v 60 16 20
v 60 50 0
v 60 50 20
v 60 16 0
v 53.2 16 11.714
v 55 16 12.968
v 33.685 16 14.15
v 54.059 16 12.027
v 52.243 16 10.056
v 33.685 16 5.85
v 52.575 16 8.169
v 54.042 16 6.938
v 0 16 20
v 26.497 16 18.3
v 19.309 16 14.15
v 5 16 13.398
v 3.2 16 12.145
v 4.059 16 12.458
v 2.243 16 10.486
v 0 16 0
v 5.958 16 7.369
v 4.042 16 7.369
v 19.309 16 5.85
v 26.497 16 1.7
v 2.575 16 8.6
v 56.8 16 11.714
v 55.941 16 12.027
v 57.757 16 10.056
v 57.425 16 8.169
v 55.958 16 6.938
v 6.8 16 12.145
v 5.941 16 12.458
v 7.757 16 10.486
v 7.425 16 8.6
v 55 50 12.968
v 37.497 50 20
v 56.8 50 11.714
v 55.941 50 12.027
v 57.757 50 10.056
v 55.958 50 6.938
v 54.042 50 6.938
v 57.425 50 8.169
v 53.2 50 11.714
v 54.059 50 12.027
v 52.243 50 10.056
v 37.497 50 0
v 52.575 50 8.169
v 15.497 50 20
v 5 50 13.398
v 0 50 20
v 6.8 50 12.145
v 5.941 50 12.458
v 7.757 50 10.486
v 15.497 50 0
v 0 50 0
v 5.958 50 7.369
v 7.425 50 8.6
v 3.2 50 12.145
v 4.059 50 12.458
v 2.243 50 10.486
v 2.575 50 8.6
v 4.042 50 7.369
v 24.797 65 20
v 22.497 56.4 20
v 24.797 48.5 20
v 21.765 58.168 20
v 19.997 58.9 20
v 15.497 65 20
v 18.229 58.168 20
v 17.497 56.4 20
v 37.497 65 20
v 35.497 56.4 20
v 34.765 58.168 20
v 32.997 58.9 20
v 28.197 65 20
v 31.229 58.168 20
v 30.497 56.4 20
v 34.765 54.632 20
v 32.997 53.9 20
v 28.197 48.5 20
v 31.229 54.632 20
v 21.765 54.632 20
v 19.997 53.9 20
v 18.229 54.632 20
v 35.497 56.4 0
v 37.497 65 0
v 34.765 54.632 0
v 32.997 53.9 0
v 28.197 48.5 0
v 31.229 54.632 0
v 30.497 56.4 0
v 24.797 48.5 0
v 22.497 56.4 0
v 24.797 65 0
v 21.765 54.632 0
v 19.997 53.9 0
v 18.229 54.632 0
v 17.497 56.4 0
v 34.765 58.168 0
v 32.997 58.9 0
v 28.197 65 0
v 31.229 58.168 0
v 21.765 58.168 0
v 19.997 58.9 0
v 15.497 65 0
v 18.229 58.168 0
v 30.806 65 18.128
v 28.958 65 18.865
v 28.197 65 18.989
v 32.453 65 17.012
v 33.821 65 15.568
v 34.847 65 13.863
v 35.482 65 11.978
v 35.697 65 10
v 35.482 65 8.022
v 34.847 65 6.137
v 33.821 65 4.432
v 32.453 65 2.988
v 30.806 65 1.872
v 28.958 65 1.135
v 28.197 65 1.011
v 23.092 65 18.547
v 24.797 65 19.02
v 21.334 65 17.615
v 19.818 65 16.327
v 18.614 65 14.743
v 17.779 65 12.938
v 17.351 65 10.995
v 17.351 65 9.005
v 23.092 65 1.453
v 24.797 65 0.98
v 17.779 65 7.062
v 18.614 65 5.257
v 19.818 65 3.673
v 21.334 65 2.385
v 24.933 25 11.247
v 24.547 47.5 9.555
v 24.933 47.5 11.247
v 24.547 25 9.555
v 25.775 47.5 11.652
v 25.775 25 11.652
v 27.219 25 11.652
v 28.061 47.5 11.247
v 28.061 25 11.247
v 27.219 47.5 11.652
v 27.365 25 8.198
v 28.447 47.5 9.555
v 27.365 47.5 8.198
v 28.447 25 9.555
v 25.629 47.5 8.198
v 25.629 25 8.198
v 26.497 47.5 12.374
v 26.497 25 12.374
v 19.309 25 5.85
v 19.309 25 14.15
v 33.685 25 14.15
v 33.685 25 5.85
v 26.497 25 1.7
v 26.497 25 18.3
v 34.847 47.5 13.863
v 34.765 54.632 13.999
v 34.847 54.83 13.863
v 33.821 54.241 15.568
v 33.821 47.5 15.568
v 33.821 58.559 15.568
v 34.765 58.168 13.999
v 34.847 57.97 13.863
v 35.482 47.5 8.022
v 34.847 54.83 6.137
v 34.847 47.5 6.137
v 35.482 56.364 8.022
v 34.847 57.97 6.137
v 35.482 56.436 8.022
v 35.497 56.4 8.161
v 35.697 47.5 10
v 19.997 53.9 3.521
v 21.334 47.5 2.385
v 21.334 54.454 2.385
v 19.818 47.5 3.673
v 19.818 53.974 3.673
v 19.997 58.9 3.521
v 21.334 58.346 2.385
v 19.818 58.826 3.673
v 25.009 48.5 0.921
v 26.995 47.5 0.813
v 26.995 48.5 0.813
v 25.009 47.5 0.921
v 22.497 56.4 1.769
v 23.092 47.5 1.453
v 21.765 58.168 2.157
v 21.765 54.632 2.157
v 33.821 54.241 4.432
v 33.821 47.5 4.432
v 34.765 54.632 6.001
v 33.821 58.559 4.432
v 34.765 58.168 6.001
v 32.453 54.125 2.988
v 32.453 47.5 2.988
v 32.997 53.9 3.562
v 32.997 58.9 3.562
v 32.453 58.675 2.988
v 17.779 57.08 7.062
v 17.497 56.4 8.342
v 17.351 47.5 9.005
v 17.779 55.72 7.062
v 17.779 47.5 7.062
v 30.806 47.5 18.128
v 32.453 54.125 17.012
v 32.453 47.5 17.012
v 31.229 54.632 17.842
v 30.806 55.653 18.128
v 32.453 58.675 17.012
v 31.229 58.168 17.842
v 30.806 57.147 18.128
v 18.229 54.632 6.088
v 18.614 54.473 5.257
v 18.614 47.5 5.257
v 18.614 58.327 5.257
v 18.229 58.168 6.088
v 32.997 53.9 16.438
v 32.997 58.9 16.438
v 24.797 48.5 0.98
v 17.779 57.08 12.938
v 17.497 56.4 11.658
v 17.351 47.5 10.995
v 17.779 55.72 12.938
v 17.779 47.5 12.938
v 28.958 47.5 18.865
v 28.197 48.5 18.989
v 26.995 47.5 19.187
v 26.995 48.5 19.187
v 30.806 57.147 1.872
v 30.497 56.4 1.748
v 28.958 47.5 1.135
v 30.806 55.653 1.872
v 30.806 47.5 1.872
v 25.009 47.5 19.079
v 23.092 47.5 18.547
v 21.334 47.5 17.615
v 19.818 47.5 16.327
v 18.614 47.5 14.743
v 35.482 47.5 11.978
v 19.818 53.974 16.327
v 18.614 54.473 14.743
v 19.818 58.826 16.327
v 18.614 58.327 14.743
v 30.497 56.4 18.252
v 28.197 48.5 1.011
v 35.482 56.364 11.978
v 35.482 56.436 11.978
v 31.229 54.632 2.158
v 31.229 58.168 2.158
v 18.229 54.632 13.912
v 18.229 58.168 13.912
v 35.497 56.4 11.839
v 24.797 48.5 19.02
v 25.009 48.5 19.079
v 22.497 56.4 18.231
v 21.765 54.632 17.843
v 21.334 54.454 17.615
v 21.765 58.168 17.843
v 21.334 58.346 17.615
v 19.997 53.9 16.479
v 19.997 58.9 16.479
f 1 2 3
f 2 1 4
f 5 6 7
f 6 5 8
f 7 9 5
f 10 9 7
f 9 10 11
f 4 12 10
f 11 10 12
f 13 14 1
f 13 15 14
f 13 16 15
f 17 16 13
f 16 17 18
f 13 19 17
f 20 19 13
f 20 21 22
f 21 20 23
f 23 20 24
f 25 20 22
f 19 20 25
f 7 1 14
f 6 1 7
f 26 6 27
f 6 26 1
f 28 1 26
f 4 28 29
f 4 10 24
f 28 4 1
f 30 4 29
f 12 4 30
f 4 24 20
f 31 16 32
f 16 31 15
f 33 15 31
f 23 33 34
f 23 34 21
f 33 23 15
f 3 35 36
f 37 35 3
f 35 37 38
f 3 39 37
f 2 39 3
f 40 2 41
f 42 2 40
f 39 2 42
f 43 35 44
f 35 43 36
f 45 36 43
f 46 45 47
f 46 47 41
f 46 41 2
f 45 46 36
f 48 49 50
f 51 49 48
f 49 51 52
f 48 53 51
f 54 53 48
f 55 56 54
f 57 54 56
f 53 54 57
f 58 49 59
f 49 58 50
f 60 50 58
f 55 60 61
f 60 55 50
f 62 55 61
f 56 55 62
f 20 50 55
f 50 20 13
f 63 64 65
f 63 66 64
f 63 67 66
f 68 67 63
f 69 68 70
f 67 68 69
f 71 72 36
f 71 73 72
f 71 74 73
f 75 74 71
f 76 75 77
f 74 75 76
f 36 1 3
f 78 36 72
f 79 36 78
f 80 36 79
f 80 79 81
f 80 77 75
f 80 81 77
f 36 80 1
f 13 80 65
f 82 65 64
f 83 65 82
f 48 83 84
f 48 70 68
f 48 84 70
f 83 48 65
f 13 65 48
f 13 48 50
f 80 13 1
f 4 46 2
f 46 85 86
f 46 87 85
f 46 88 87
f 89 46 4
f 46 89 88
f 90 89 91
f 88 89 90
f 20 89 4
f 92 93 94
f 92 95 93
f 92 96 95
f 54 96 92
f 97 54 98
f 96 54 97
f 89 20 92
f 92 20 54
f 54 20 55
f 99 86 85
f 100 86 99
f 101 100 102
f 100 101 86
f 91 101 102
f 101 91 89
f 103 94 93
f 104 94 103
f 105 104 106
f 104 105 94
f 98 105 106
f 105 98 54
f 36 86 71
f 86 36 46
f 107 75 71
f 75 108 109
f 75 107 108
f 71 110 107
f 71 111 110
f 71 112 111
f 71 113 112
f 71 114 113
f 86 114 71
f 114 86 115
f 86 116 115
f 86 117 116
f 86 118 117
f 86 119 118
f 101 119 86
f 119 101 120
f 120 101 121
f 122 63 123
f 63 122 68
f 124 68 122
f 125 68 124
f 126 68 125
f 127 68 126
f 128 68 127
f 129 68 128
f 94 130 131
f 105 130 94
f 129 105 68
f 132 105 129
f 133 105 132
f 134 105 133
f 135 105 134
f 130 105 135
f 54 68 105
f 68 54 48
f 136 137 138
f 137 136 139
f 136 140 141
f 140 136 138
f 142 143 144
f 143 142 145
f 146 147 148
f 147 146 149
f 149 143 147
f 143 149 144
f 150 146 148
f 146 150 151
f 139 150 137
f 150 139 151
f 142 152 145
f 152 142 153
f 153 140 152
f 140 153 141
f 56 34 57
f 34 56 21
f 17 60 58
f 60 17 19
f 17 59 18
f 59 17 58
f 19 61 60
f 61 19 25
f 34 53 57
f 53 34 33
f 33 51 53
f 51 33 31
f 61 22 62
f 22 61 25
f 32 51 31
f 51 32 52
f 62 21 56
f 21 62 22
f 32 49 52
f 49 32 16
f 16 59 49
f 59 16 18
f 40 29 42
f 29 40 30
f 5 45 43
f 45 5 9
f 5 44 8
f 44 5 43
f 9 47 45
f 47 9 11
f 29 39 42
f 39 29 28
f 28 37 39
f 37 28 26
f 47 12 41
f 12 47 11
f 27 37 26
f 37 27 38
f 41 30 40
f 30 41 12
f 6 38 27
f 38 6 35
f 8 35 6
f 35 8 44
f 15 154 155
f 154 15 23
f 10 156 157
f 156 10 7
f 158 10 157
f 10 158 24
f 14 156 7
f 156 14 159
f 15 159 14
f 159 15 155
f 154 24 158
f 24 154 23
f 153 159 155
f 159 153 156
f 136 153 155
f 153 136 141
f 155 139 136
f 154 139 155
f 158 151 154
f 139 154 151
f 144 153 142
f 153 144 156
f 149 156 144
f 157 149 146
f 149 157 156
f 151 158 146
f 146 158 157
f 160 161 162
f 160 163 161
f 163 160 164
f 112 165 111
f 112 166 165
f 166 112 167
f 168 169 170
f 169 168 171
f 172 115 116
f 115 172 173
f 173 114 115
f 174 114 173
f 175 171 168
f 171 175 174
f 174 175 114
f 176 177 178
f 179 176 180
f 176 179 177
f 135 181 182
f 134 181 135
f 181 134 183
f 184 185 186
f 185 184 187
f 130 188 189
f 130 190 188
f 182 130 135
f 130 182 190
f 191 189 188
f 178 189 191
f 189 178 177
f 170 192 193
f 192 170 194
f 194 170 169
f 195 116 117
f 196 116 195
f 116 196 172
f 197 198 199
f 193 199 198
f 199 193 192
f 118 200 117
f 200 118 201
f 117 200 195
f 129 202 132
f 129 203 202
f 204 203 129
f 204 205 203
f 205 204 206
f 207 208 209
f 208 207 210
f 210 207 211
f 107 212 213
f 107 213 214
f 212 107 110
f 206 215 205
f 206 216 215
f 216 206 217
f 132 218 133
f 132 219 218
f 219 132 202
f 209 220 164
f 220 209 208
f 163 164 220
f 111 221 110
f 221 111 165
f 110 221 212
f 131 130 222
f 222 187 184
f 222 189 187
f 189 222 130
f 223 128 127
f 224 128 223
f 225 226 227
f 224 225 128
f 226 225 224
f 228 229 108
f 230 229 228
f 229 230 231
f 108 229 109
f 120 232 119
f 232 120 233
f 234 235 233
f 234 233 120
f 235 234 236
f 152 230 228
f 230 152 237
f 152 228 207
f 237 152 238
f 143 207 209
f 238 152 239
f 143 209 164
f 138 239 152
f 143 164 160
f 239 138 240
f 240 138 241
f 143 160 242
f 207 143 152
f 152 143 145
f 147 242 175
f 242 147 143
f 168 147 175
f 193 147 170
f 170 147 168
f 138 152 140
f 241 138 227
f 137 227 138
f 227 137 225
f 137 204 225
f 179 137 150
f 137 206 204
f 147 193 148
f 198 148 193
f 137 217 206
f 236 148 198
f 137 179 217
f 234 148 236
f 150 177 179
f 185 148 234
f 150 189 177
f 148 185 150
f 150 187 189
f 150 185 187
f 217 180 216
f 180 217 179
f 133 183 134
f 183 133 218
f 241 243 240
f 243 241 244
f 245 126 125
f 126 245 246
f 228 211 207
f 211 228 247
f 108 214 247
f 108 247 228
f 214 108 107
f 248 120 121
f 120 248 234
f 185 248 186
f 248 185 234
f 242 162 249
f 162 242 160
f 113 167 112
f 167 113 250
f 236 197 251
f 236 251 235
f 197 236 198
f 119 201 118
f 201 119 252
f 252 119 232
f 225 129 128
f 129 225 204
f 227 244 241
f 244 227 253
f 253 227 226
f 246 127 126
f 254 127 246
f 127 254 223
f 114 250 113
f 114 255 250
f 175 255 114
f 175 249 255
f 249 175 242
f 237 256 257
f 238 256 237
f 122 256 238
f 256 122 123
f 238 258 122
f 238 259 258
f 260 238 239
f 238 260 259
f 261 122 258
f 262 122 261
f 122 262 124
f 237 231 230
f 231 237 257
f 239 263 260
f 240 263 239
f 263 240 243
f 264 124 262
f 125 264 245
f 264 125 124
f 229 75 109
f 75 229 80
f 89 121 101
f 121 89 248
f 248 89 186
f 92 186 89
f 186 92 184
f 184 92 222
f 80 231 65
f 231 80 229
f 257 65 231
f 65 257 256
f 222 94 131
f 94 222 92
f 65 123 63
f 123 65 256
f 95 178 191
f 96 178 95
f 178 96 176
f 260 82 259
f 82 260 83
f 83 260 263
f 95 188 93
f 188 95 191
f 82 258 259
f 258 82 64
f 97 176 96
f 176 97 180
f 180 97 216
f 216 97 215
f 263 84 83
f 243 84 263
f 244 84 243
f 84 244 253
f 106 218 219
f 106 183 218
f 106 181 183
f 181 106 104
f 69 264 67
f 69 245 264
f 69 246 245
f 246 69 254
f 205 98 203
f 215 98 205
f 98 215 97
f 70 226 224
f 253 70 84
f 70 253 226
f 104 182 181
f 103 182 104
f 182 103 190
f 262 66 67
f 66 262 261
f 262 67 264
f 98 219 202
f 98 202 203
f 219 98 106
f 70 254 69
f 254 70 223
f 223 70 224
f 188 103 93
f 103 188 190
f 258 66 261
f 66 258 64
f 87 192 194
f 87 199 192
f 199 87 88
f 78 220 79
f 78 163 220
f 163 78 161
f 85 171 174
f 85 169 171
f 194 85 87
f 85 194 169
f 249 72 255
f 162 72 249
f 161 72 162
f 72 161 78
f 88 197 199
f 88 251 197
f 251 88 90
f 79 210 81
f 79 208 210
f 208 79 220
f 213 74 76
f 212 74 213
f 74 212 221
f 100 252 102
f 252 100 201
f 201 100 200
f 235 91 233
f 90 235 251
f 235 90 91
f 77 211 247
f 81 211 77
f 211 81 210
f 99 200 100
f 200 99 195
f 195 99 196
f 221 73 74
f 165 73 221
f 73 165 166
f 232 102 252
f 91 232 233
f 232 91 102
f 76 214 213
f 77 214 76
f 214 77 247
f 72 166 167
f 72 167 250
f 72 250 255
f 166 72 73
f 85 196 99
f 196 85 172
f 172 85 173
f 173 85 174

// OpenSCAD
// Parametric Mendel Extruder in SCAD by Vik, based on SCAD conversion by rbisping
// vik@diamondage.co.nz, 2010-01-02
// Pinch bearing & filament size is parametric. Also added pointy tops to horizontal holes.

m4_clearance_rad=2.6;
bearing_clearance_rad=8;
filament_rad=1.6;		// Includes some clearance.
ptfe_rad=9.2;			// 18mm dia PTFE spacer. May well be 16mm rad for you.

nut_rad = 8.3;			// M8 nut on the bowden cable
extruder_thick=20;
extruder_height=34;
extruder_clamp_thick=30;
filament_x_offset=26.497;

module box(w,h,d) {
	scale ([w,h,d]) cube(1, true);
}

module roundedBox(w,h,d,f){
	difference(){
		box(w,h,d);
		translate([-w/2,h/2,0]) cube(w/(f/2),true);
		translate([w/2,h/2,0]) cube(w/(f/2),true);
		translate([-w/2,-h/2,0]) cube(w/(f/2),true);
		translate([w/2,-h/2,0]) cube(w/(f/2),true);
	}
	translate([-w/2+w/f,h/2-w/f,-d/2]) cylinder(d,w/f, w/f);
	translate([w/2-w/f,h/2-w/f,-d/2]) cylinder(d,w/f, w/f);
	translate([-w/2+w/f,-h/2+w/f,-d/2]) cylinder(d,w/f, w/f);
	translate([w/2-w/f,-h/2+w/f,-d/2]) cylinder(d,w/f, w/f);
}
module hexagon(height, depth) {
	boxWidth=height/1.75;
		union(){
			box(boxWidth, height, depth);
			rotate([0,0,60]) box(boxWidth, height, depth);
			rotate([0,0,-60]) box(boxWidth, height, depth);
		}
}

module m4_hole_horiz(l) {
	cylinder(l,m4_clearance_rad+0.2,m4_clearance_rad+0.2,center=true);
	translate ([m4_clearance_rad*0.6,0,0]) rotate ([0,0,45])
		cube([m4_clearance_rad,m4_clearance_rad,l],center=true);
}

module m8_hole_horiz(l) {
	cylinder(l,m8_clearance_rad,m4_clearance_rad,center=true);
	translate ([m8_clearance_rad*0.6,0,0]) rotate ([0,0,45])
		cube([m8_clearance_rad,m8_clearance_rad,l],center=true);
}

module m4_hole_vert(l) {
	cylinder(l,m4_clearance_rad+0.2,m4_clearance_rad+0.2,center=true);
}

module m6_hole_horiz(l) {
	cylinder(l,m6_clearance_rad,m6_clearance_rad,center=true);
	translate ([m6_clearance_rad*0.6,0,0]) rotate ([0,0,45])
		cube([m6_clearance_rad,m6_clearance_rad,l],center=true);
}
module m8_hole_horiz(l) {
	cylinder(l,m8_clearance_rad,m8_clearance_rad,center=true);
	translate ([m8_clearance_rad*0.6,0,0]) rotate ([0,0,45])
		cube([m8_clearance_rad,m8_clearance_rad,l],center=true);
}

// No .4 3/4 inch countersunk woodscrew (includes a lot of headspace)
module small_woodscrew() {
	rotate ([0,0,30]) {
		translate ([0,0,-7.5]) cylinder(h=3,r1=0.2,r2=1.8,center=true);
		cylinder(h=12,r1=1.8,r2=2.0,center=true);
		translate([0,0,6]) cylinder(h=4, r1=2.0, r2=4.0);
	}
}

// For nut cavities, "height" is the max distance between two points on the hex.
module m4_nut_cavity(l) {
	hexagon(height=8,depth=l);
}

module m8_nut_cavity(l) {
	hexagon(height=14,depth=l);
}

module m4_hole_vert_with_hex(l) {
	union () {
		m4_hole_vert(l);
		translate ([0,0,-l/4]) rotate ([0,0,30]) m4_nut_cavity(l/2);
	}
}

module m4_hole_horiz_with_hex(l) {
	union () {
		m4_hole_horiz(l);
		translate ([0,0,-l/4]) rotate ([0,0,0]) m4_nut_cavity(l/2);
	}
}

module m3_slot() {
	cube([7.149,extruder_thick*2.1,3.4],center=true);
}

filament_oversize=0.4;	// If your extruder is perfect this can be zero :)
module filament_cavity() {
	union () {
		cylinder(100,filament_rad+filament_oversize,filament_rad+filament_oversize,center=true);
		translate ([0.6*filament_rad,0,0]) rotate ([0,0,45])
			cube([filament_rad+filament_oversize,filament_rad+filament_oversize,100],center=true);
	}
}

module pinchwheel()
{
translate([-40,10,0])rotate(90,[1,0,0])
{
difference()
	{
	union()
		{
		// Main block of the thing.
       		translate([30,extruder_thick/2,22])cube([60,extruder_thick,extruder_height], center = true);
		// PTFE holder (for woodscrews instead of epoxy)
		translate([filament_x_offset,extruder_thick/2,0])cube([22,extruder_thick,20], center = true);
		}
	union()
		{
translate([filament_x_offset,extruder_thick/2,21.635])rotate([0,0,90]) filament_cavity();

		// Horizontal M4 holes
		translate([5,extruder_thick/2,22.0])rotate([0,0,90]) m4_hole_horiz(extruder_height*1.1);
		translate([55,extruder_thick/2.09,22])rotate([0,0,90]) m4_hole_horiz(extruder_height*1.1);

//Hex Filament Nut Hole
#translate([filament_x_offset,extruder_thick/2,40]) rotate ([90,0,0]) rotate([90,90,0])cylinder(h=20,r=nut_rad,center=true, $fn=6);

		// Split PTFE holder
		#translate([filament_x_offset,extruder_thick/2,-2.5]) rotate ([90,0,0]) rotate([90,0,0])cylinder(h=20,r=ptfe_rad,center=true);
		#translate([filament_x_offset ,extruder_thick/2, -2.5])cube([3.4,20.889,18],center = true);
		// 3mm holes for woodscrews
		#translate([filament_x_offset-6.5,extruder_thick/2,-1.4]) rotate ([90,0,0]) cylinder(h=extruder_thick*2,r=2.5,center=true);
		#translate([filament_x_offset+6.5,extruder_thick/2,-1.4]) rotate ([90,0,0]) cylinder(h=extruder_thick*2,r=2.5,center=true);
		}
	}
}
}

// Put it in X+ve, Y+ve
translate ([40,45,0]) pinchwheel();
